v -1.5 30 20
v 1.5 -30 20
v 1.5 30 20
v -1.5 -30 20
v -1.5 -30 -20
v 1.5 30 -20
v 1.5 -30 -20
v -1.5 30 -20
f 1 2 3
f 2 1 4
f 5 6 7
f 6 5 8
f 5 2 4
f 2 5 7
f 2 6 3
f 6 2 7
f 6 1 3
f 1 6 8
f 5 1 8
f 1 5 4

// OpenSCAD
// Direct reproduction of INCIDENTS.md 2026-09-11 ("side panels: (a) no
// fastening at all"): a side panel that shipped as a bare plate with zero
// attachment features. It passes connectivity (one solid) and dimensions
// (exactly the declared size) while being impossible to fasten to anything.
//
// The declared attachment point sits where the M3 boss belongs -- 4.5mm out
// from the panel face -- and falls in empty air, because the boss was removed
// "to make the assembly fit" and never restored.

$fa = 2; $fs = 0.3;

// EXPECTED_BBOX: [3, 60, 40]

// the panel itself: thin plate at x=0
cube([3, 60, 40], center = true);

// NOTE: no boss here. [4.5, 20, 15] is 3mm clear of the panel face, in air.
